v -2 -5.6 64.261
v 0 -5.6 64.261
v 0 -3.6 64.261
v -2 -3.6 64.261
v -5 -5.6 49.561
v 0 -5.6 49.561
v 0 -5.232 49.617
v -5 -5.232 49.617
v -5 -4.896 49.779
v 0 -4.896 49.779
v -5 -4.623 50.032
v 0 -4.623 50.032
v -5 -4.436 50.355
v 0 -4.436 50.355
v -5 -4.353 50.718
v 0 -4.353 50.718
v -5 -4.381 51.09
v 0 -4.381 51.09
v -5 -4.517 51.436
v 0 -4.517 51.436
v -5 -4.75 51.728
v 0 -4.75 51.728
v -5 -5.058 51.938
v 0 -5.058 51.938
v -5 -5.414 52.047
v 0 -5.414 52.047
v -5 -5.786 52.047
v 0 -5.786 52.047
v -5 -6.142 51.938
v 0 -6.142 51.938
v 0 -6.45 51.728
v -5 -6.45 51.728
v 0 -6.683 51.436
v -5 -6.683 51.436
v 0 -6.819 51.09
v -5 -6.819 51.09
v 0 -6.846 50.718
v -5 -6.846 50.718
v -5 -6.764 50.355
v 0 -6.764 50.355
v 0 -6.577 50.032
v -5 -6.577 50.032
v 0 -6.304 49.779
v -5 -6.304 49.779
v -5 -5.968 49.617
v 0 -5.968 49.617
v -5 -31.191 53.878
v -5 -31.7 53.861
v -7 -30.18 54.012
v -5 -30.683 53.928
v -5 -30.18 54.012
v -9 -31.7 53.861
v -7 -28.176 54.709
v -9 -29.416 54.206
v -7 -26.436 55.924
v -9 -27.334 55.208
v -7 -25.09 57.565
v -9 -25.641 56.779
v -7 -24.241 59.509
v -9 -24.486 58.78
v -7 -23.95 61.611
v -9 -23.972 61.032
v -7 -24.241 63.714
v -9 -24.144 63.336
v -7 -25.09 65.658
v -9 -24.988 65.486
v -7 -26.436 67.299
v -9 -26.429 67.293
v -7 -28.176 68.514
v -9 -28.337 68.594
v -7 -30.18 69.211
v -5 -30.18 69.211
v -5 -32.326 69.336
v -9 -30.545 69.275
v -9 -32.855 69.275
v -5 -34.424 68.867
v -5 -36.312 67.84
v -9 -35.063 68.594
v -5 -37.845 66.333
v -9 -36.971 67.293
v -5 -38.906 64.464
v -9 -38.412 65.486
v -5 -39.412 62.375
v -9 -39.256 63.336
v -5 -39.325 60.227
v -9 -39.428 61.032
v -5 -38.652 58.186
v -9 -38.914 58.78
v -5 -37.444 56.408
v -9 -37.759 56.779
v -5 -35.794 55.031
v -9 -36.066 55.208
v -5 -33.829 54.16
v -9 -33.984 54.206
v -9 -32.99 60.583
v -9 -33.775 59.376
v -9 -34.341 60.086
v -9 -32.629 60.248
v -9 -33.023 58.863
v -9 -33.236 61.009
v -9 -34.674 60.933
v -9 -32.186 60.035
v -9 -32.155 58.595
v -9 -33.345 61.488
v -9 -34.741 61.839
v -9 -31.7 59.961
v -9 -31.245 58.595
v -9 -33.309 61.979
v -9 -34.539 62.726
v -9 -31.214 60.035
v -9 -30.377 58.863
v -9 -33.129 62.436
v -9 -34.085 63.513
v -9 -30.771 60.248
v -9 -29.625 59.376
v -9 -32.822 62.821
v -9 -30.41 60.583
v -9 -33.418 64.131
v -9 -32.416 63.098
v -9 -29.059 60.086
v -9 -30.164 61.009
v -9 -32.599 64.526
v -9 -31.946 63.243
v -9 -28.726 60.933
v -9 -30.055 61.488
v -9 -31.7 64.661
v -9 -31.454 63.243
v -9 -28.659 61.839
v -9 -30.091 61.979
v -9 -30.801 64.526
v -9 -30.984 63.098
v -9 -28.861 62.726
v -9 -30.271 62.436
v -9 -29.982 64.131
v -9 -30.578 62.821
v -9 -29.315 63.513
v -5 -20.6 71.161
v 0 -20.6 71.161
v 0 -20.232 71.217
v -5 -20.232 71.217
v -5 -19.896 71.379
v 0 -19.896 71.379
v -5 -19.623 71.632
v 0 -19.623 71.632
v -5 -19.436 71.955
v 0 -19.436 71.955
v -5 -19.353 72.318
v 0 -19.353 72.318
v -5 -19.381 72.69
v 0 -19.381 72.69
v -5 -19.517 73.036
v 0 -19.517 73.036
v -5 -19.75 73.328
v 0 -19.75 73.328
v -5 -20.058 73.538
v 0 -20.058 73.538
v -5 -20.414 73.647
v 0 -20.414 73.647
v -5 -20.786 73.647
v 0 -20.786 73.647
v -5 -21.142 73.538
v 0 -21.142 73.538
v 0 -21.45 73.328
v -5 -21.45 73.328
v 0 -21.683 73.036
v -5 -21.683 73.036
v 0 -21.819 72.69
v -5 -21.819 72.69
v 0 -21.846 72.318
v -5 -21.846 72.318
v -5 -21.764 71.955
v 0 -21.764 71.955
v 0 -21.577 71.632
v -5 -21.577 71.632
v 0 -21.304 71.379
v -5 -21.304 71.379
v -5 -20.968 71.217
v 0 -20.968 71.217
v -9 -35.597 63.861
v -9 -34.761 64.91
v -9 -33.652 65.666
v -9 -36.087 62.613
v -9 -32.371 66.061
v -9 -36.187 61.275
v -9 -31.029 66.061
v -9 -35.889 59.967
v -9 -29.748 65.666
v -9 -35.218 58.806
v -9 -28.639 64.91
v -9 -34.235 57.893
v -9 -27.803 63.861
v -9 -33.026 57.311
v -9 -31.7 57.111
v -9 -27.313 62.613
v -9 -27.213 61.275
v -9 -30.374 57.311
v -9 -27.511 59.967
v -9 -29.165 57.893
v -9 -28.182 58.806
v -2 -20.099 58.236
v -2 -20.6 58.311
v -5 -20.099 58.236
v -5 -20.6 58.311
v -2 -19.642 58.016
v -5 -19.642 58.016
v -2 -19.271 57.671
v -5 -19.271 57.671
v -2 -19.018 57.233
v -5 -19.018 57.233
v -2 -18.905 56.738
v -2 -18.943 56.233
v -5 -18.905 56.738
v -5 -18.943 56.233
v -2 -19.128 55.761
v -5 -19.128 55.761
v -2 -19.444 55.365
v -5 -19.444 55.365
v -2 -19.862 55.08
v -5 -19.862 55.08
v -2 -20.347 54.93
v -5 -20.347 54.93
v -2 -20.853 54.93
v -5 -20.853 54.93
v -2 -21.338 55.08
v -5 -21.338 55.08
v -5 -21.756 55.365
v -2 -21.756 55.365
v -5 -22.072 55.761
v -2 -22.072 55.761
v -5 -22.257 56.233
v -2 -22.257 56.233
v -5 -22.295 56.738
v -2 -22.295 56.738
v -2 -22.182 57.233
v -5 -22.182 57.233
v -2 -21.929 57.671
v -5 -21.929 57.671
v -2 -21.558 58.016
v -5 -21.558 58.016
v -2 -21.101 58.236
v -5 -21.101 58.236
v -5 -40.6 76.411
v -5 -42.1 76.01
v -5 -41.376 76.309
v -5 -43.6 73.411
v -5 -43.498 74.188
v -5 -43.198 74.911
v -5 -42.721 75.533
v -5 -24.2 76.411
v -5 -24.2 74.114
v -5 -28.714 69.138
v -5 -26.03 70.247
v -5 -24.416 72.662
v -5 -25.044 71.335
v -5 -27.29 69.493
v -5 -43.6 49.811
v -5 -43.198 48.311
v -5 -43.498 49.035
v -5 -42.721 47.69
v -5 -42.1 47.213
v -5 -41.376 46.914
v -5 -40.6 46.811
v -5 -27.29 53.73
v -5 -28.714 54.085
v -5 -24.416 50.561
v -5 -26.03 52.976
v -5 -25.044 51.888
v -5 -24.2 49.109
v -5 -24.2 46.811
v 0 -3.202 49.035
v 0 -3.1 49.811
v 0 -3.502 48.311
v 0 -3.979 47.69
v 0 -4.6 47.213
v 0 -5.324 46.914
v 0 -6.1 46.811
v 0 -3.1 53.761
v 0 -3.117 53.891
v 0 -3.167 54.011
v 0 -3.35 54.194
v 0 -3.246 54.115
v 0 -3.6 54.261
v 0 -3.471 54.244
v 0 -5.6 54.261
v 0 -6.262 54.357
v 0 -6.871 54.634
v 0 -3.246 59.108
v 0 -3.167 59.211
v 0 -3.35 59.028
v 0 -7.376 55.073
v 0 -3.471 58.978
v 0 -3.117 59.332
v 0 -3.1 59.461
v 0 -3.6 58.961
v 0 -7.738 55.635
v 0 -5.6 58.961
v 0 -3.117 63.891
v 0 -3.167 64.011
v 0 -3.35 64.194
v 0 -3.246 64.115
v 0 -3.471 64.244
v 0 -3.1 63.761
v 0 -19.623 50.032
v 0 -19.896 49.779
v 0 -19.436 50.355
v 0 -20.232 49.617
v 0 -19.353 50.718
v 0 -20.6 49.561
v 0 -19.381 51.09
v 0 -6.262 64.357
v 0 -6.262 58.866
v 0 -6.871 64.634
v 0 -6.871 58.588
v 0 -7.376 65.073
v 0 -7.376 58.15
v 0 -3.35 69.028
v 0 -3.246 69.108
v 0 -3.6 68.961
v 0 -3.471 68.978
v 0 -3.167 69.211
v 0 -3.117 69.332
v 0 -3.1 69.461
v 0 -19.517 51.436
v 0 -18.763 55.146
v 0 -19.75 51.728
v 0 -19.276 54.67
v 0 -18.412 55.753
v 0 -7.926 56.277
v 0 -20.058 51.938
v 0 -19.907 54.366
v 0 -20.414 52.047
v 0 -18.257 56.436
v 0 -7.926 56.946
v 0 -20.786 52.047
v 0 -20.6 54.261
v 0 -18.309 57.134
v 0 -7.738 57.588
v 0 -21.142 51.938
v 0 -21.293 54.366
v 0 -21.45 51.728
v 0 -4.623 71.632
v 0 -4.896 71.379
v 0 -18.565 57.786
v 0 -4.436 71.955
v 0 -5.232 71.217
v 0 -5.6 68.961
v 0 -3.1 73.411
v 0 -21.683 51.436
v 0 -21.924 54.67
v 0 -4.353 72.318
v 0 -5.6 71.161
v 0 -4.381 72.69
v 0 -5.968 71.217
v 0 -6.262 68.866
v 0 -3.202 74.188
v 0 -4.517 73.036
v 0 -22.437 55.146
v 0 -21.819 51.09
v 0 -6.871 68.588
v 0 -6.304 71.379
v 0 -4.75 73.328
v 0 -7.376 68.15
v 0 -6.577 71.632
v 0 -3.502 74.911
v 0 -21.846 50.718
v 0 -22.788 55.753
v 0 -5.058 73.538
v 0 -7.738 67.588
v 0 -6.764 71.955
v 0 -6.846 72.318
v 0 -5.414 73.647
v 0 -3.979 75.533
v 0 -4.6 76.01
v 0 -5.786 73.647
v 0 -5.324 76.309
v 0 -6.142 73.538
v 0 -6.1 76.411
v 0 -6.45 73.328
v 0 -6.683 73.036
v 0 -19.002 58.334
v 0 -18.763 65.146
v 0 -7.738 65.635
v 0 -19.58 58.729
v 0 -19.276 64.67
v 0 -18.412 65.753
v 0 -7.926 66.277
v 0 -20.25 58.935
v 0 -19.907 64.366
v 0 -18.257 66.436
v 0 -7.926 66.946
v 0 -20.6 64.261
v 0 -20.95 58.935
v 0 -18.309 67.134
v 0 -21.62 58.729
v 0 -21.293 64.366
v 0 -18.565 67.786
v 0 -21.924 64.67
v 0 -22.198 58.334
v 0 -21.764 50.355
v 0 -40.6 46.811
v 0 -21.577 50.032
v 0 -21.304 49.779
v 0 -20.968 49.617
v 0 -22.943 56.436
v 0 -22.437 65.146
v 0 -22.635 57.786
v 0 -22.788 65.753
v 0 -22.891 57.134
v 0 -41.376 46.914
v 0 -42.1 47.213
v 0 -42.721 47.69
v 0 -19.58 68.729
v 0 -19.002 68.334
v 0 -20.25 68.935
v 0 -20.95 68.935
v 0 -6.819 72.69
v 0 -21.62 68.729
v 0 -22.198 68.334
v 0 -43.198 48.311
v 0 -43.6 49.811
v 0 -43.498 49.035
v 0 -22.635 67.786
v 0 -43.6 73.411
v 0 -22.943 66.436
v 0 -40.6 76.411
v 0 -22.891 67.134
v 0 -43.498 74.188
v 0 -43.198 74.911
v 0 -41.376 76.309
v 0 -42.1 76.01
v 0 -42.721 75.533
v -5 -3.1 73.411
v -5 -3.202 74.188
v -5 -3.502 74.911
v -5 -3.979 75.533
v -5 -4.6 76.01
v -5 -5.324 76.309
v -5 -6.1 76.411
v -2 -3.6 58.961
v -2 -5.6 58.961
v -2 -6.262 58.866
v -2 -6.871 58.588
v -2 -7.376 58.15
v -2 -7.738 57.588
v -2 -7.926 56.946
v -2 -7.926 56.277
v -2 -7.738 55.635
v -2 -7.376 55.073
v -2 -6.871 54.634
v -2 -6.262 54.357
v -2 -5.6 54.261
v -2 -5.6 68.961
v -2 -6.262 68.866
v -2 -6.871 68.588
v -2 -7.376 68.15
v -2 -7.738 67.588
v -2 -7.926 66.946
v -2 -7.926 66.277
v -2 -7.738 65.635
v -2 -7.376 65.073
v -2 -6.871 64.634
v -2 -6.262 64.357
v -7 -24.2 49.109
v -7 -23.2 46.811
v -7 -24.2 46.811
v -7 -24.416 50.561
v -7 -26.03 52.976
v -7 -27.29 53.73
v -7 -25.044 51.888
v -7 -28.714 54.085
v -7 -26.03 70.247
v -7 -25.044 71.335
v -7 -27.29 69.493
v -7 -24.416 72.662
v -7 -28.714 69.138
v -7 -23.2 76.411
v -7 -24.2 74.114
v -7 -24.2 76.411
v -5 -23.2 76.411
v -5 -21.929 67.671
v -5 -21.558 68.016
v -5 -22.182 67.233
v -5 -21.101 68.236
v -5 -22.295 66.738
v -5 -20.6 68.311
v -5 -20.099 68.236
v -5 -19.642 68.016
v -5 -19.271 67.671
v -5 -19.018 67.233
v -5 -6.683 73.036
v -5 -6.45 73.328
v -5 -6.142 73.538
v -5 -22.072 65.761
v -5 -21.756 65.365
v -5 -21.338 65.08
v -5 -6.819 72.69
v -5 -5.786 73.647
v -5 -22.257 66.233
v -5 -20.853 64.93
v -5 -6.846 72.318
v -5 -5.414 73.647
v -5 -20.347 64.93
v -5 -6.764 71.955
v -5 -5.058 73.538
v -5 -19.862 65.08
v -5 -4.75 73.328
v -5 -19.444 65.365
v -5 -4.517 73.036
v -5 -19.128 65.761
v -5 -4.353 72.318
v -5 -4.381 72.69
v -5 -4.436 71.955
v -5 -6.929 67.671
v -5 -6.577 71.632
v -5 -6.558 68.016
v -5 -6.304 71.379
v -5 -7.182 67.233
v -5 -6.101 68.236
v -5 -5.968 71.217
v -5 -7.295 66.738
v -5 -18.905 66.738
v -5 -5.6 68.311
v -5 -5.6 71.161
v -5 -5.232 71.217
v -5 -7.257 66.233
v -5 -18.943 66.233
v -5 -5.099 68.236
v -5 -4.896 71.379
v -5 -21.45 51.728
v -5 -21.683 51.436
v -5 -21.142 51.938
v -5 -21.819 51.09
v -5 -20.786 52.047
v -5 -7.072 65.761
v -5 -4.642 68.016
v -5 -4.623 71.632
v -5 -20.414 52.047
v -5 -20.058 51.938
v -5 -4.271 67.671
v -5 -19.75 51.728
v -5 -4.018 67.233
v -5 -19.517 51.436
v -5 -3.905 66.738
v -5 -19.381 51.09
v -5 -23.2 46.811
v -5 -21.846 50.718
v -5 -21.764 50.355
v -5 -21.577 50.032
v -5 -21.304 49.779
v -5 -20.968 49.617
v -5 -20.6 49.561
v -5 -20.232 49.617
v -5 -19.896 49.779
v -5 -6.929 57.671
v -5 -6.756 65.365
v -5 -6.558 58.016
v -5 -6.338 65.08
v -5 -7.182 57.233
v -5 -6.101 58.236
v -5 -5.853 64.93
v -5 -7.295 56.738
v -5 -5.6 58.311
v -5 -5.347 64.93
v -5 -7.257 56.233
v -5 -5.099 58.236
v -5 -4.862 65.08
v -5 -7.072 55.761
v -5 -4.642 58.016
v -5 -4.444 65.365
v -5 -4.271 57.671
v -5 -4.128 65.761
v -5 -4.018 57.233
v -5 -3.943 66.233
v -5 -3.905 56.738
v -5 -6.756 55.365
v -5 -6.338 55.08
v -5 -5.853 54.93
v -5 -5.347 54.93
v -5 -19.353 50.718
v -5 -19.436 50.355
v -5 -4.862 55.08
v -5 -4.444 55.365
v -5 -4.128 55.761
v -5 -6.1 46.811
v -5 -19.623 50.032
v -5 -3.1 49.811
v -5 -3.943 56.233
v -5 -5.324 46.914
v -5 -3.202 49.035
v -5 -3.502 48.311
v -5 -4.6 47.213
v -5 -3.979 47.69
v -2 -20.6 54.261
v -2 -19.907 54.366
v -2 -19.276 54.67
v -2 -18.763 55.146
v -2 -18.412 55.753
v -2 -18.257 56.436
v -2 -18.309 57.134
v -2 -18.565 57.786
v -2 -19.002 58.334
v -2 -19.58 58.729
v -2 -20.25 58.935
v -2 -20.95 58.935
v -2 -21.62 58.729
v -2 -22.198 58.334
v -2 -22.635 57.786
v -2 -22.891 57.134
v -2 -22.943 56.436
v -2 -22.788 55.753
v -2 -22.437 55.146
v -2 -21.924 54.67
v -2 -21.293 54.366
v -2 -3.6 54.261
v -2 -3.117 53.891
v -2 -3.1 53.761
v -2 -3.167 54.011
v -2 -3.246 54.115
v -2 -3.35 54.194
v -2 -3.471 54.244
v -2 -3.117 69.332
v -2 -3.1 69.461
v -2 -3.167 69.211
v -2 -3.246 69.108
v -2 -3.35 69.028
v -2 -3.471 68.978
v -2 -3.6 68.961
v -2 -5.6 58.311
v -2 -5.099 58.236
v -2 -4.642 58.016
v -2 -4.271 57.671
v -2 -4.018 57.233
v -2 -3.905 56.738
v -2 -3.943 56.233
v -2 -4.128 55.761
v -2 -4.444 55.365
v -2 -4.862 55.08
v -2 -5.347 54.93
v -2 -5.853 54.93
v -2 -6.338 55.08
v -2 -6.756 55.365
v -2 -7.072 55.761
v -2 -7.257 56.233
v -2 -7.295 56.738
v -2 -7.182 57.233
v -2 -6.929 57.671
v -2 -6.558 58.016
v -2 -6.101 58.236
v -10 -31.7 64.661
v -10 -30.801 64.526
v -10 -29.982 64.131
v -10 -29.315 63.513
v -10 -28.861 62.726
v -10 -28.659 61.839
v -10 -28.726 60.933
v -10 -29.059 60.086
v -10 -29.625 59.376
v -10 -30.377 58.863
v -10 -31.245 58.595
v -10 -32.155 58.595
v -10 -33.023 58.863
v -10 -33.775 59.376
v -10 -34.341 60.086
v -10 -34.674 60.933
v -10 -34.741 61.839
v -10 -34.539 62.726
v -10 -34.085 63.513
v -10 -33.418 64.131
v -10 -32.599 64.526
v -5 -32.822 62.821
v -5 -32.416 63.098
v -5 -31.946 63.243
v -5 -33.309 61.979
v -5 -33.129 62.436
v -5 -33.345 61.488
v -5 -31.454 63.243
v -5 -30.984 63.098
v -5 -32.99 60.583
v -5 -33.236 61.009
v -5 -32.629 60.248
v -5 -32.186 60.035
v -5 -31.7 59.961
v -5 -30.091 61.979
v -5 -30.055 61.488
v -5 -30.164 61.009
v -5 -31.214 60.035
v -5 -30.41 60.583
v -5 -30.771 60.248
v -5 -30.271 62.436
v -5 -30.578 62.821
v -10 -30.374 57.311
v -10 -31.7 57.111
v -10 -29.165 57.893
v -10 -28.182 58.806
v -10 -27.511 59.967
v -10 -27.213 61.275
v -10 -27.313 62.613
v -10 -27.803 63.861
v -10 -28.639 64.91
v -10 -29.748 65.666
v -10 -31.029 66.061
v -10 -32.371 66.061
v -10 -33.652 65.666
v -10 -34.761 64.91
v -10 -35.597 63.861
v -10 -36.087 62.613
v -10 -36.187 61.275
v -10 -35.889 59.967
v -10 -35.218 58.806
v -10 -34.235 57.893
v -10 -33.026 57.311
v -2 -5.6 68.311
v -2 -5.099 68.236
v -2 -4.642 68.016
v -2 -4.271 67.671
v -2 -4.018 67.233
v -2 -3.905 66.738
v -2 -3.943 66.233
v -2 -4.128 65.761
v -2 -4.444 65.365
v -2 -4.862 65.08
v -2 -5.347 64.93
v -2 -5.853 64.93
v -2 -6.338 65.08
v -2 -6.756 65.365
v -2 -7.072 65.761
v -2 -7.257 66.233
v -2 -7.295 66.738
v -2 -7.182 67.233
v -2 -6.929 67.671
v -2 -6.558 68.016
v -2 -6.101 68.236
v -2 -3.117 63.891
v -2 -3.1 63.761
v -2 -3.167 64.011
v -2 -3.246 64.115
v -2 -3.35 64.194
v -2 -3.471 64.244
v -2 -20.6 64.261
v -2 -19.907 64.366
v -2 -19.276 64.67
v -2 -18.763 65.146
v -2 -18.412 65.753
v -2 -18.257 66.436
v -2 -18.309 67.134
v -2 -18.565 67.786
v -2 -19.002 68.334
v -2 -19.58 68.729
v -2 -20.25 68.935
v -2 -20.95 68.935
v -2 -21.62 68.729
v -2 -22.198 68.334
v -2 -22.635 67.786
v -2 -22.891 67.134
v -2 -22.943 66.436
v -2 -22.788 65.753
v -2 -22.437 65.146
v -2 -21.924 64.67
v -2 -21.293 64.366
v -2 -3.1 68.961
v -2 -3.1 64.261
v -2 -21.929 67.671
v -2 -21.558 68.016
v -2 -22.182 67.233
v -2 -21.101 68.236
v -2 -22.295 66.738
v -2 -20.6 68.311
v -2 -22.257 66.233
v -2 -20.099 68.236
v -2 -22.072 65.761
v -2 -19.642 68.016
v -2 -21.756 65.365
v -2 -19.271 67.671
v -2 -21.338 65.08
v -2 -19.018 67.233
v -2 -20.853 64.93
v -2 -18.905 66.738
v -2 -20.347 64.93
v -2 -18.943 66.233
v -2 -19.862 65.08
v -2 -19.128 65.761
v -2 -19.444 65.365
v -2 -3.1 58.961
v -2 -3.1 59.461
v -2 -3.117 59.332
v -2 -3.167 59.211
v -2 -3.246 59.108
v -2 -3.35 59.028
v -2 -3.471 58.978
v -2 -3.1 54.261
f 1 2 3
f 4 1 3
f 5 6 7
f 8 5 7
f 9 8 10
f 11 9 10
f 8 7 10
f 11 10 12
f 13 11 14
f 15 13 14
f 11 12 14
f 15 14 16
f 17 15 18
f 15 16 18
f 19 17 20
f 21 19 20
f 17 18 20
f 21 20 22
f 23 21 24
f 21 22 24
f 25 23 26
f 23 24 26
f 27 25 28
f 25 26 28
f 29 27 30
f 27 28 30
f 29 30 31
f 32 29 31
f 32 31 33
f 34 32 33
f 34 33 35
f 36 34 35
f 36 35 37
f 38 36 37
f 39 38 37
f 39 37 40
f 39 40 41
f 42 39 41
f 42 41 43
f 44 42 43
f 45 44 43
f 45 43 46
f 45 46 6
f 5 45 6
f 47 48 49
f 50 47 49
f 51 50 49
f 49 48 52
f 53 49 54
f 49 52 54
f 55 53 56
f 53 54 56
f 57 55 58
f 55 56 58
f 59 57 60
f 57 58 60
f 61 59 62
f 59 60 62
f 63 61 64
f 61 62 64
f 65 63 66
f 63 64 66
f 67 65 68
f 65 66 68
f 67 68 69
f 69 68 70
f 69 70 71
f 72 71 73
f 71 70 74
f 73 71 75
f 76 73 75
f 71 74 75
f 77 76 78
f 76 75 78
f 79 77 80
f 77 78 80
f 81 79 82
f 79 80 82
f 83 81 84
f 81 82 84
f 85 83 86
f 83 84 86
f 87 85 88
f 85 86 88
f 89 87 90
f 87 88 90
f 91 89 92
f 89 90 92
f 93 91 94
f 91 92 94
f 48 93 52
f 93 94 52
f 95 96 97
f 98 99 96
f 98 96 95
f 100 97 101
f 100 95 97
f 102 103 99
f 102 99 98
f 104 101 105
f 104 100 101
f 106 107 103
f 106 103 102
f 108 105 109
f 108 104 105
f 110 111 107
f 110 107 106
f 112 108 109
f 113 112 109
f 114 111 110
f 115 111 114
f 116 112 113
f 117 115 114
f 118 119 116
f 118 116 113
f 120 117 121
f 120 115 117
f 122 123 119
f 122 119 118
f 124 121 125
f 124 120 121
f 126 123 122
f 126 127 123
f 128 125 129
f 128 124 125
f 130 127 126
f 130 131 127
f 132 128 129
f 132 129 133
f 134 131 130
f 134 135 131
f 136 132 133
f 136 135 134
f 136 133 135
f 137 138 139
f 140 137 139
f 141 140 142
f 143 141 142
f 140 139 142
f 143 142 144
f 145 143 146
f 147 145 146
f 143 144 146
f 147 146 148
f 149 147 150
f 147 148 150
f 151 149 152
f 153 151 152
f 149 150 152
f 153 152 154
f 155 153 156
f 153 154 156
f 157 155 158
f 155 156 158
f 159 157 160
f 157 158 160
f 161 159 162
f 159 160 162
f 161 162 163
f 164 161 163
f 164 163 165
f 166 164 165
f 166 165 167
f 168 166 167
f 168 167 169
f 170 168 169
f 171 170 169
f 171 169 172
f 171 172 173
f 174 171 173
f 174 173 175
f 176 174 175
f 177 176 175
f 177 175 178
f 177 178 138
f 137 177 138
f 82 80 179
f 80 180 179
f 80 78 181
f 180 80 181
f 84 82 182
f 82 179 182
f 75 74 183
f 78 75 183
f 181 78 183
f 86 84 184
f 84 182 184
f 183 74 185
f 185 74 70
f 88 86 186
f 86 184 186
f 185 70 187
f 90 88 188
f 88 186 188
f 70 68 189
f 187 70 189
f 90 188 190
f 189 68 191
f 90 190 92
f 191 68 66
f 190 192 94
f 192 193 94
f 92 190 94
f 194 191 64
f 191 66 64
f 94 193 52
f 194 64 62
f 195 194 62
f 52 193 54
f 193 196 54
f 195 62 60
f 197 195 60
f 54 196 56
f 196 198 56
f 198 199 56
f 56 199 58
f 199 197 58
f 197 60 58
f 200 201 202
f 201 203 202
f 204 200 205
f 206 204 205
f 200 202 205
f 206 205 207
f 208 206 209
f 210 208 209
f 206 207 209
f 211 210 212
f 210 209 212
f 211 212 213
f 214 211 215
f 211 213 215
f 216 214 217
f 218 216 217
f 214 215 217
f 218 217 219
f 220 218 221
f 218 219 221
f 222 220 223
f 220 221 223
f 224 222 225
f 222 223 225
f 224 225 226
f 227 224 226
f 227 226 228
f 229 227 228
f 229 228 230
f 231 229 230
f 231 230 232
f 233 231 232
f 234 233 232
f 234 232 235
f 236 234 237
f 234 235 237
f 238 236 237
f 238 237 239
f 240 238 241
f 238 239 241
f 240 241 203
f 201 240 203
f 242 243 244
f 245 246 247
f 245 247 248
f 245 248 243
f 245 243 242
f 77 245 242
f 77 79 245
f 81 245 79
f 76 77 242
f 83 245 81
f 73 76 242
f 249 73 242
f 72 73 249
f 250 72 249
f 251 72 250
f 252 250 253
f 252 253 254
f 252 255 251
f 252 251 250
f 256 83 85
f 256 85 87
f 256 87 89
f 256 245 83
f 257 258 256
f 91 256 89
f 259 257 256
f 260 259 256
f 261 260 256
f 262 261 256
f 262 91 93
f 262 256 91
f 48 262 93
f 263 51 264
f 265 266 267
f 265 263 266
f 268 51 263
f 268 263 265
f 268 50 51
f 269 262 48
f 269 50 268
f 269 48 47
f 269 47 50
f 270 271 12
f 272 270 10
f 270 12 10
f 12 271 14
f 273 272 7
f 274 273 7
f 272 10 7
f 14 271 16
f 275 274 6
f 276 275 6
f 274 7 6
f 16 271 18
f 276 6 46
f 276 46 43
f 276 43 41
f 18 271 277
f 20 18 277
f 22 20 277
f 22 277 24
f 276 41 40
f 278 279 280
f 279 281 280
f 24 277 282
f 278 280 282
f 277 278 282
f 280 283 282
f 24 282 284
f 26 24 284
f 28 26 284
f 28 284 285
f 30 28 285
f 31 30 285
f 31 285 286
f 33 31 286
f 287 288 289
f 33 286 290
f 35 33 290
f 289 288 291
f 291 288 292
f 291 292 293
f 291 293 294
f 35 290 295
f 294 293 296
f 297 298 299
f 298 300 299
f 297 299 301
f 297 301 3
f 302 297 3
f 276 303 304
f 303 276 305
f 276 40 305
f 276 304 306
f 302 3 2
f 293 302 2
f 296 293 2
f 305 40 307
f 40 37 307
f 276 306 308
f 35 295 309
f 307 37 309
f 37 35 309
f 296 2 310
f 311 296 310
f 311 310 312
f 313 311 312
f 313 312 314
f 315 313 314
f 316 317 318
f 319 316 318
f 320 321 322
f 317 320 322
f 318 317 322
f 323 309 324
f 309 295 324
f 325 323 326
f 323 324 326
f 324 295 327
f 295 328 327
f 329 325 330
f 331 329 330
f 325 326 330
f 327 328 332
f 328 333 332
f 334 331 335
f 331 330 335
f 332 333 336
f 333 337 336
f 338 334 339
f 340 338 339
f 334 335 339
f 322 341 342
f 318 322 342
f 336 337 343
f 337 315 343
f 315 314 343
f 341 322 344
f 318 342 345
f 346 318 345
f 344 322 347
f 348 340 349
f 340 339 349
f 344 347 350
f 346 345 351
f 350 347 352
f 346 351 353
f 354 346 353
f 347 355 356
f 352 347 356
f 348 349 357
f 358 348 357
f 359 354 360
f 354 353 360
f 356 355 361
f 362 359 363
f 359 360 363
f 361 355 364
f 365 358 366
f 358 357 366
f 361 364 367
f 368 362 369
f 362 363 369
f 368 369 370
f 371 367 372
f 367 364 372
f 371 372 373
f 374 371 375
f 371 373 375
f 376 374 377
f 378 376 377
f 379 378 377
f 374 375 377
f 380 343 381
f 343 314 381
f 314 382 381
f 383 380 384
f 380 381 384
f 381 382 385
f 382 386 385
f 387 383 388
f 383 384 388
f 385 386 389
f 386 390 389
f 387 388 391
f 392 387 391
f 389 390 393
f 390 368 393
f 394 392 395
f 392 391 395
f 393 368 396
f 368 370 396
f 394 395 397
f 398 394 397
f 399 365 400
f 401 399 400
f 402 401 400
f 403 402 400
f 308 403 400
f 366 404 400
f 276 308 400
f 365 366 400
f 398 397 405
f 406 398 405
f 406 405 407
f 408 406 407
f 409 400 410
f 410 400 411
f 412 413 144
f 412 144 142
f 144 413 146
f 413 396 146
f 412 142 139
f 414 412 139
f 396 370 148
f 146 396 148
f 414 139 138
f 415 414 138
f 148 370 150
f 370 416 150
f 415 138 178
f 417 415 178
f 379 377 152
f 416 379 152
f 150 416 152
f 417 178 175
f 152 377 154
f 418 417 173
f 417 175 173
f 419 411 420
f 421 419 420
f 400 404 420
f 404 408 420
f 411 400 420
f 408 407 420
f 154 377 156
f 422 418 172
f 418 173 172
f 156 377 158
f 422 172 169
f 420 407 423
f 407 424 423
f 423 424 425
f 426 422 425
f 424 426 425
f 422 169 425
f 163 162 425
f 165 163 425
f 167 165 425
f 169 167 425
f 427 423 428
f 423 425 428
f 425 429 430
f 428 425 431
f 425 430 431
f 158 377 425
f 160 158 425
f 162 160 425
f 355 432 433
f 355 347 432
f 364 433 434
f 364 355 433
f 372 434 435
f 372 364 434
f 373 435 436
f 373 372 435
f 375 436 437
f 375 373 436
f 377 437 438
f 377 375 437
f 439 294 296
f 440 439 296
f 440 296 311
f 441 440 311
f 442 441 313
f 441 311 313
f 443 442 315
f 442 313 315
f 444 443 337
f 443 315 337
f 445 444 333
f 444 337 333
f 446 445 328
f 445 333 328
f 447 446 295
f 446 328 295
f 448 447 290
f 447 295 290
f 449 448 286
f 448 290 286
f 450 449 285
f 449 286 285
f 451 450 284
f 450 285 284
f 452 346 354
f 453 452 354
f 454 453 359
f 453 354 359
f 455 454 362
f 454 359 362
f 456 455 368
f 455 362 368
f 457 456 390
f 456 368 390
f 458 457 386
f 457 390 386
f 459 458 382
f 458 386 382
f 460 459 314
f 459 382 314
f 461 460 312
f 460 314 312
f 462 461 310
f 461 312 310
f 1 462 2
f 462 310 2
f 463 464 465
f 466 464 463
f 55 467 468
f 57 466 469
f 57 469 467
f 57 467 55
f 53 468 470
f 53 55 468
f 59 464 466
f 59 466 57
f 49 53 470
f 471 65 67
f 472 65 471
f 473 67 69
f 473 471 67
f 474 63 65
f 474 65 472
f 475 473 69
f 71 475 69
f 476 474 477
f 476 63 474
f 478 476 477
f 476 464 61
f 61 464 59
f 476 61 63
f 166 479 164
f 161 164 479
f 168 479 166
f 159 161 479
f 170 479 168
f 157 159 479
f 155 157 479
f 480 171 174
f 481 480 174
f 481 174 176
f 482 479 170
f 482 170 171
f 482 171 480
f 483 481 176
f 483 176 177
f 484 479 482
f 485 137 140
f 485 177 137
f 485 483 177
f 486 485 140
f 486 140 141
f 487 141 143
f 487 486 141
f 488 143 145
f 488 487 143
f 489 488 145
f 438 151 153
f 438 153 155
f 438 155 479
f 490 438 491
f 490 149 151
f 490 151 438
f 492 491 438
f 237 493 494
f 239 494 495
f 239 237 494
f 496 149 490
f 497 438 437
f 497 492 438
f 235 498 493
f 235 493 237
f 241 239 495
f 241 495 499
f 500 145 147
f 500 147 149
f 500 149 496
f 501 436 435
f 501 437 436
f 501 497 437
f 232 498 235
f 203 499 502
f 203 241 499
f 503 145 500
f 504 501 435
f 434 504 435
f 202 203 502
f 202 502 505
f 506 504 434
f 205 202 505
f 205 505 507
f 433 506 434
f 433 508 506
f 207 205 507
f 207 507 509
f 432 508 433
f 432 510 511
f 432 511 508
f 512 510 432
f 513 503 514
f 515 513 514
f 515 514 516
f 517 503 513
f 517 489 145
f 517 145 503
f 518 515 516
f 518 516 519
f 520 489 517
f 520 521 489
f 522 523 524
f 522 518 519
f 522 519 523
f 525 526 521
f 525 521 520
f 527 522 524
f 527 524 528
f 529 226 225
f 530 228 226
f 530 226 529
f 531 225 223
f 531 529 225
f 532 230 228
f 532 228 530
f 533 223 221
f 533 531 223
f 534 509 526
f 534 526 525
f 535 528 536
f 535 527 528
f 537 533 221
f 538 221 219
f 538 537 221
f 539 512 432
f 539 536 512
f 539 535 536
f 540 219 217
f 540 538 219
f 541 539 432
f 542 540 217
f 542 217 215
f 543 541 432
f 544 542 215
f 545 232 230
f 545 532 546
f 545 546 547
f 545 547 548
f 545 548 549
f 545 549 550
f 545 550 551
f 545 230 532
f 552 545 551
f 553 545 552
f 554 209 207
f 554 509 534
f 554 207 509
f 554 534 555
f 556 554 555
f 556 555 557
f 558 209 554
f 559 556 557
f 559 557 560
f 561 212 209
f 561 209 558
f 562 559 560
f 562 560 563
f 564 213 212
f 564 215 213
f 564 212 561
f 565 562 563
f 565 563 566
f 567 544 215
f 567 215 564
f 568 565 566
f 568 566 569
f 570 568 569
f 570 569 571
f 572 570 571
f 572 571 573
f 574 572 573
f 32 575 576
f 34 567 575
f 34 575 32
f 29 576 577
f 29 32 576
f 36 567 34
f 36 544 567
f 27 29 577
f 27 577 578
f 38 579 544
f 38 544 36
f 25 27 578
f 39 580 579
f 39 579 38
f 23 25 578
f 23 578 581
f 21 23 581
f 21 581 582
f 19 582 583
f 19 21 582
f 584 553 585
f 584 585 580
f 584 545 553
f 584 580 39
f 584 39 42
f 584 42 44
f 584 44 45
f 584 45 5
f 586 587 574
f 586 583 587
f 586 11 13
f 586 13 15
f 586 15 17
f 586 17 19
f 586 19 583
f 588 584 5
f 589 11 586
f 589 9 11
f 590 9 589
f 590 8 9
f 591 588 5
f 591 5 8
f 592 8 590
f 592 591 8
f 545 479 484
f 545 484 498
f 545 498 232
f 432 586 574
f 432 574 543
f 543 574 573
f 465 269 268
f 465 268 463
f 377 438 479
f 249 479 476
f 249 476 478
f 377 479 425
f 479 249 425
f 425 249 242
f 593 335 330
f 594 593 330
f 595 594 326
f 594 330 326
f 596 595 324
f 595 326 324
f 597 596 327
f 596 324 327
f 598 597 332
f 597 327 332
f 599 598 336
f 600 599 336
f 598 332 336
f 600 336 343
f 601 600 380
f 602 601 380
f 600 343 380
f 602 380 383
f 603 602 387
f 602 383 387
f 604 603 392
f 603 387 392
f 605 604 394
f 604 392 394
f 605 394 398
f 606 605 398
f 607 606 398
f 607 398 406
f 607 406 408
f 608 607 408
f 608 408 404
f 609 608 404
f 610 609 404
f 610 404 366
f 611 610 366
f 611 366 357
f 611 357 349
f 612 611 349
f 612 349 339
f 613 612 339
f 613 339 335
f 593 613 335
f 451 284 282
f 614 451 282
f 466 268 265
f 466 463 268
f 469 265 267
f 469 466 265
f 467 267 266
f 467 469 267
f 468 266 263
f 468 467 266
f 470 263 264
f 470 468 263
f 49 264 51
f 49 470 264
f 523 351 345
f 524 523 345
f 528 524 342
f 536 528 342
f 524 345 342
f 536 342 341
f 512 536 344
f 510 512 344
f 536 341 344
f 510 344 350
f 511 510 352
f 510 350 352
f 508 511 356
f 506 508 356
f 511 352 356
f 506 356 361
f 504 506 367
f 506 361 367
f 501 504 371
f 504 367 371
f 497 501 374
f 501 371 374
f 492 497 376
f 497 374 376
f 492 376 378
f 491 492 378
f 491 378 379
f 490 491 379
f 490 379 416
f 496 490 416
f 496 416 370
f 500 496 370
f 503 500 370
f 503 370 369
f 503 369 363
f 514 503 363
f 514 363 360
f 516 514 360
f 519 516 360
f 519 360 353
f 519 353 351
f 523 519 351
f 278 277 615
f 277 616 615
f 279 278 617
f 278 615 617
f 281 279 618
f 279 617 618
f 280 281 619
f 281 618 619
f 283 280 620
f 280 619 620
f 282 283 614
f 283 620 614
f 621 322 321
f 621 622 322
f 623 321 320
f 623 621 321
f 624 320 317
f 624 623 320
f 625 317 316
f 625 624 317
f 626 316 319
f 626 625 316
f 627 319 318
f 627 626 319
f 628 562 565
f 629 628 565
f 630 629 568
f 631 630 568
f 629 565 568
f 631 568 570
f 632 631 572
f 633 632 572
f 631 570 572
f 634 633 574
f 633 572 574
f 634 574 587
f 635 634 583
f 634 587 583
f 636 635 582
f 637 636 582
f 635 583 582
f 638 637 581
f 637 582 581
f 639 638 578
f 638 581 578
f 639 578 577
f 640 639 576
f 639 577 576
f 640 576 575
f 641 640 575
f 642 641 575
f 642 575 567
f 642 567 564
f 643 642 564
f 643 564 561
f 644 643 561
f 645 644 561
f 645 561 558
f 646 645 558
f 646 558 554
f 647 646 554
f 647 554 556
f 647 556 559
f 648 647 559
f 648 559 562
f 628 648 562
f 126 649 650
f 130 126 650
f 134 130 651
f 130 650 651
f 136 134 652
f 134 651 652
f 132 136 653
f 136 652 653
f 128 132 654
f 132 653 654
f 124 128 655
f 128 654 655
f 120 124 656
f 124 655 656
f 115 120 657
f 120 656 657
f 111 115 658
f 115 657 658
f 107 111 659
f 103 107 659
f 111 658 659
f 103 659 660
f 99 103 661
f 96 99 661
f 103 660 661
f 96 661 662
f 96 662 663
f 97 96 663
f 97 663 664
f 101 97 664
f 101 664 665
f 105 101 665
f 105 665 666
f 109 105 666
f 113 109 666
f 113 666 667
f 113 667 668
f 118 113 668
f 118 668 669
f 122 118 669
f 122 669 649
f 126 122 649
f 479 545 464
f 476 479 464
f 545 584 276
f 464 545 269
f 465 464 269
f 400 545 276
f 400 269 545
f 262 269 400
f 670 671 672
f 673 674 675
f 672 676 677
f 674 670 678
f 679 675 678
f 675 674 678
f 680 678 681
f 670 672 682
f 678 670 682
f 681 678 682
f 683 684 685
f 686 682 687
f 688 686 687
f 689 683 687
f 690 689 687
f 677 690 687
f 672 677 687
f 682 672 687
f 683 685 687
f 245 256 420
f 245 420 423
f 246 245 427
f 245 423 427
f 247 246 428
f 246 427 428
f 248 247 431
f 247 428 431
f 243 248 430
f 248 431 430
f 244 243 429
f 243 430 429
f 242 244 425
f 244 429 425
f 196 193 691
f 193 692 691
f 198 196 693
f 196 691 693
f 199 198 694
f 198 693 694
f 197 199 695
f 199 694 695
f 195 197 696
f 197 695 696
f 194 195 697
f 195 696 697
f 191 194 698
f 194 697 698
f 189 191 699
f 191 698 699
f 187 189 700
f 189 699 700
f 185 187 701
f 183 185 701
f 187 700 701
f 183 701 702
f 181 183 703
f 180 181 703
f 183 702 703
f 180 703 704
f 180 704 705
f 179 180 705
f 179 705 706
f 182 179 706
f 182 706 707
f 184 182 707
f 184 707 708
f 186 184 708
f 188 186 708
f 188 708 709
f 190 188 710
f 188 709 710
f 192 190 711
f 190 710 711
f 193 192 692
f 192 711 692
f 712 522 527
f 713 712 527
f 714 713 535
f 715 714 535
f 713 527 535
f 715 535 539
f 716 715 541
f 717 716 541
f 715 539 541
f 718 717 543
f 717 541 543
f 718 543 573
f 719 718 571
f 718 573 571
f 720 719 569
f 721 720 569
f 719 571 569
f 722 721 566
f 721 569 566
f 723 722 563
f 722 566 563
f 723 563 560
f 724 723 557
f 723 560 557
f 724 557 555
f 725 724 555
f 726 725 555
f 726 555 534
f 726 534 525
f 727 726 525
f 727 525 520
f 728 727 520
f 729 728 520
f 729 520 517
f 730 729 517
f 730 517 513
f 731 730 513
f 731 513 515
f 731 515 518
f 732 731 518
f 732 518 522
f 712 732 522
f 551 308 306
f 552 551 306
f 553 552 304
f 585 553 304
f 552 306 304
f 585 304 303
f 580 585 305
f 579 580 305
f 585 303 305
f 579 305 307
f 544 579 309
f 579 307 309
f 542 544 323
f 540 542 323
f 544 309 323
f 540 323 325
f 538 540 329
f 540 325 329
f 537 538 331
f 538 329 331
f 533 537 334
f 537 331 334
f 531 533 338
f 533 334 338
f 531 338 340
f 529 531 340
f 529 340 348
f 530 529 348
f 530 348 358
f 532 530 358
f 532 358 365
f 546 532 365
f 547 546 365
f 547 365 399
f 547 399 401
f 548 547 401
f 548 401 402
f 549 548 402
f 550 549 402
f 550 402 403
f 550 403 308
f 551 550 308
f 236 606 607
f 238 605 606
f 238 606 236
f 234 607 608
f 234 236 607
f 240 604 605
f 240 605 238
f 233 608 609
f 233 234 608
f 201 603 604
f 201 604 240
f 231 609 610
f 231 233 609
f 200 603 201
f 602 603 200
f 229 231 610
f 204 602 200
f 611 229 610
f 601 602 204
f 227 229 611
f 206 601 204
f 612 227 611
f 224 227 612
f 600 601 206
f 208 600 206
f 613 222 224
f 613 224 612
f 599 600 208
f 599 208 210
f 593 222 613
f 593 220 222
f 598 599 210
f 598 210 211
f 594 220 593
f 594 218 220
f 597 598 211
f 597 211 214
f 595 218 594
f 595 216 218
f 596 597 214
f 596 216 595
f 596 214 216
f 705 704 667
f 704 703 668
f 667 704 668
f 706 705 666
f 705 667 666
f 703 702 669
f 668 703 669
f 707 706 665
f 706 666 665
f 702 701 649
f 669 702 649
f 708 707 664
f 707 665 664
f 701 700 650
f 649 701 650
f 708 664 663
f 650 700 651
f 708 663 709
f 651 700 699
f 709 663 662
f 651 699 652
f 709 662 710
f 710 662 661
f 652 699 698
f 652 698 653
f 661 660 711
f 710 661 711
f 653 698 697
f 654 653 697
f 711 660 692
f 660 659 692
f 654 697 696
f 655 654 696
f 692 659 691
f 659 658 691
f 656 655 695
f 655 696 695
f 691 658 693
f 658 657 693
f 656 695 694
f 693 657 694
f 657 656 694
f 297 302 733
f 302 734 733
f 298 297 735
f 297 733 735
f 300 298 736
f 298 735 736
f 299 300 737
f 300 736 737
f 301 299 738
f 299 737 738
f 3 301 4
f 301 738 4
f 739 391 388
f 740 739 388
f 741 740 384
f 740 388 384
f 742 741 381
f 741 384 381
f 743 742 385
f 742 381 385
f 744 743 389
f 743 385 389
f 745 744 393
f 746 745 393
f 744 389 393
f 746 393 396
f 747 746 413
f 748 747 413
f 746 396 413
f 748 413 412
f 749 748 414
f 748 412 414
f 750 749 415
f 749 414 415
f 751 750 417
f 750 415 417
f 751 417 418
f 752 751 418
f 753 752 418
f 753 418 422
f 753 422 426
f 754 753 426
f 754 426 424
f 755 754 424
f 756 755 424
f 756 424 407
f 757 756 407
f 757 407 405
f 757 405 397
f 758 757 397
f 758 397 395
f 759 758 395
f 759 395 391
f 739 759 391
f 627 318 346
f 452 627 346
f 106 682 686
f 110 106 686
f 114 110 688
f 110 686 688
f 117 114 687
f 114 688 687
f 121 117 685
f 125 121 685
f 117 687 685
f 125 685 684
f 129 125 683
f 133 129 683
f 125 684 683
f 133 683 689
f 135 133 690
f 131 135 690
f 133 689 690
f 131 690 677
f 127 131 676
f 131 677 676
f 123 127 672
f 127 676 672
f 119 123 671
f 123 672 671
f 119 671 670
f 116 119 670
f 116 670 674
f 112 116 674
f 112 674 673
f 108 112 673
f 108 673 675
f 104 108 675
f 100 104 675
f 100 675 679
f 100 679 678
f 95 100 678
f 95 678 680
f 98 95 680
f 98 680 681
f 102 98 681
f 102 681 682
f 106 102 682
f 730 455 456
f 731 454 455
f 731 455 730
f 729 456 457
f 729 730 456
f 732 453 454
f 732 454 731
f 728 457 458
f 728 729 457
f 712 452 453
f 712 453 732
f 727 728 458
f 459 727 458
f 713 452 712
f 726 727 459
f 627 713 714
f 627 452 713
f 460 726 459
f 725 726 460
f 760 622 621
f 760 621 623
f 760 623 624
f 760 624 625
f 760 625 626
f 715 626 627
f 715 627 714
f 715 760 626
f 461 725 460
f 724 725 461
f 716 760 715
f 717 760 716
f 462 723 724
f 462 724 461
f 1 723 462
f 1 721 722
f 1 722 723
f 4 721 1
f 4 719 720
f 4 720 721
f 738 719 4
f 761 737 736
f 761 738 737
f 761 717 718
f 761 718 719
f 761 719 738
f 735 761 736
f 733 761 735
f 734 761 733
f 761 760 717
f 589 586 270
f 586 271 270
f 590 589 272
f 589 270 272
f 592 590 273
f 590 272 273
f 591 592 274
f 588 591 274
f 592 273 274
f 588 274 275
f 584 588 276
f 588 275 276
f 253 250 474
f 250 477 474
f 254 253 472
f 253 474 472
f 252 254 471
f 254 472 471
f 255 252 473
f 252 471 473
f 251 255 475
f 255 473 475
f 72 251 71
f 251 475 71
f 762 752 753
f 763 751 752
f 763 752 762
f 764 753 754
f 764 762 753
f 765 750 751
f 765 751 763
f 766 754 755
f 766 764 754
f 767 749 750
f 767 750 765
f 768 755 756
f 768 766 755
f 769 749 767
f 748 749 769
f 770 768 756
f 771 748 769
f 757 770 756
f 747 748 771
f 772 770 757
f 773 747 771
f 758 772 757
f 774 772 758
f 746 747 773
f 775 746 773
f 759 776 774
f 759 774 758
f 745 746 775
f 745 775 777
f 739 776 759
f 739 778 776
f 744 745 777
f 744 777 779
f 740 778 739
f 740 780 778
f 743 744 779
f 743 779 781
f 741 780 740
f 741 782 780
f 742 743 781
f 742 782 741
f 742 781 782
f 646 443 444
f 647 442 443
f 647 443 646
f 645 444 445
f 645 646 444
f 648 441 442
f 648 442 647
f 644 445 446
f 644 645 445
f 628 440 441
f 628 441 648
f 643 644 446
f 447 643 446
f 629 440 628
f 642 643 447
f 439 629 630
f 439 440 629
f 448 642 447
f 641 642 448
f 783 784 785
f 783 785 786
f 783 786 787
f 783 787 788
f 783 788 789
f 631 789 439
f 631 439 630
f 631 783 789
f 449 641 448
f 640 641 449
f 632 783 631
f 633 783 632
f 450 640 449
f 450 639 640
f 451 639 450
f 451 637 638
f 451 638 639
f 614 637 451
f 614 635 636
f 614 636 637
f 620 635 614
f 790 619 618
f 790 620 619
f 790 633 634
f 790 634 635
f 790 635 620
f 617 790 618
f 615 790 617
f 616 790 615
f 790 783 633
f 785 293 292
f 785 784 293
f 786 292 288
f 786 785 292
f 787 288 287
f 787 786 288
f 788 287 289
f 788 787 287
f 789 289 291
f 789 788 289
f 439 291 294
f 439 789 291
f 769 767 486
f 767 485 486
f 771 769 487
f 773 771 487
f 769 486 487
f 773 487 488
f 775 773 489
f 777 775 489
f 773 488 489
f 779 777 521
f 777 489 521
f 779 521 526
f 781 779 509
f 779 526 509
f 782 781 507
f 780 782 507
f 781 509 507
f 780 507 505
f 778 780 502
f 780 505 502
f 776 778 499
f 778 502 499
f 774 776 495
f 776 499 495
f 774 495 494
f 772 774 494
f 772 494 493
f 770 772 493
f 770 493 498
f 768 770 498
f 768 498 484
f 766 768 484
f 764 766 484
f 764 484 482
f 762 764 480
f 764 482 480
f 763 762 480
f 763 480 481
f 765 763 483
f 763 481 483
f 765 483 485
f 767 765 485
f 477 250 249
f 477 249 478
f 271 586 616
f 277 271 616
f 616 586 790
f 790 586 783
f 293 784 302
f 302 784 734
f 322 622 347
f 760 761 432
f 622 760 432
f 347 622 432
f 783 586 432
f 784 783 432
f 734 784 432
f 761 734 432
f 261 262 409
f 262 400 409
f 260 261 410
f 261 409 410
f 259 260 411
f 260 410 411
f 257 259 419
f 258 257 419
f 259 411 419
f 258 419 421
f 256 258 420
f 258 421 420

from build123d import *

# Parameters (mm, degrees)
SKETCH_1_W                   = 40.499972991
SKETCH_1_H                   = 29.6
EXTRUDE_1_DEPTH              = 7
SKETCH_2_W                   = 2
SKETCH_2_H                   = 20.10000001
CUT_EXTRUDE_1_DEPTH          = 54.161241934
SKETCH_3_W                   = 2
SKETCH_3_H                   = 19.399972981
CUT_EXTRUDE_2_DEPTH          = 54.161241934
CUT_EXTRUDE_3_DEPTH          = 2
CUT_EXTRUDE_4_DEPTH          = 2
HOLE_WIZARD_2_5_2_5_1_D      = 2.5
HOLE_WIZARD_3_4_3_4_1_D      = 3.4
HOLE_WIZARD_3_4_3_4_1_DEPTH  = 8
HOLE_WIZARD_M3_1_D           = 3.4
HOLE_WIZARD_M3_1_DEPTH       = 10
HOLE_WIZARD_M3_1_CBORE_D     = 4.7
HOLE_WIZARD_M3_1_CBORE_DEPTH = 2
HOLE_WIZARD_M3_2_D           = 3.3
HOLE_WIZARD_M3_2_DEPTH       = 5
HOLE_WIZARD_M3_2_CBORE_D     = 6.1
HOLE_WIZARD_M3_2_CBORE_DEPTH = 1
FILLET_1_R                   = 0.5
FILLET_2_R                   = 3
FILLET_3_R                   = 5


with BuildPart() as part:
    # 草图1 → 凸台-拉伸1 (new body)
    with BuildSketch(Plane(origin=(-7, 0, 0), x_dir=(0, -1, 0), z_dir=(-1, 0, 0))):
        with Locations((23.349986486, 61.611428686)):
            Rectangle(SKETCH_1_W, SKETCH_1_H)
    extrude(amount=-EXTRUDE_1_DEPTH)

    # 草图2 → 切除-拉伸1 (cut, through all)
    with BuildSketch(Plane(origin=(0, 0, 46.811428686), x_dir=(-1, 0, 0), z_dir=(0, 0, -1))):
        with Locations((6, -13.149999995)):
            Rectangle(SKETCH_2_W, SKETCH_2_H)
    extrude(amount=-CUT_EXTRUDE_1_DEPTH, mode=Mode.SUBTRACT)

    # 草图3 → 切除-拉伸2 (cut, through all)
    with BuildSketch(Plane(origin=(0, 0, 46.811428686), x_dir=(-1, 0, 0), z_dir=(0, 0, -1))):
        with Locations((6, -33.89998649)):
            Rectangle(SKETCH_3_W, SKETCH_3_H)
    extrude(amount=-CUT_EXTRUDE_2_DEPTH, mode=Mode.SUBTRACT)

    # 草图4 → 切除-拉伸3 (cut)
    with BuildSketch(Plane(origin=(0, 0, 0), x_dir=(0, 0, -1), z_dir=(1, 0, 0))):
        with BuildLine():
            Line((-58.961428686, -3.09999999), (-58.961428686, -5.6))
            ThreePointArc((-58.961428686, -5.6), (-56.611428686, -7.95), (-54.261428686, -5.6))
            Line((-54.261428686, -5.6), (-54.261428686, -3.09999999))
            Line((-54.261428686, -3.09999999), (-58.961428686, -3.09999999))
        make_face()
    extrude(amount=-CUT_EXTRUDE_3_DEPTH, mode=Mode.SUBTRACT)

    # 草图5 → 切除-拉伸4 (cut)
    with BuildSketch(Plane(origin=(0, 0, 0), x_dir=(0, 0, -1), z_dir=(1, 0, 0))):
        with BuildLine():
            Line((-68.961428686, -3.09999999), (-68.961428686, -5.6))
            ThreePointArc((-68.961428686, -5.6), (-66.611428686, -7.95), (-64.261428686, -5.6))
            Line((-64.261428686, -5.6), (-64.261428686, -3.09999999))
            Line((-64.261428686, -3.09999999), (-68.961428686, -3.09999999))
        make_face()
    extrude(amount=-CUT_EXTRUDE_4_DEPTH, mode=Mode.SUBTRACT)

    # 草图6 → 旋转1 (revolve)
    with BuildSketch(Plane(origin=(0, -31.7, 0), x_dir=(1, 0, 0), z_dir=(0, 1, 0))):
        Polygon((-10, -57.111428686), (-10, -61.611428686), (-5, -61.611428686), (-5, -53.861428686), (-9, -53.861428686), (-9, -57.111428686), align=None)
    revolve(axis=Axis((-10, -31.7, 61.611428686), (1, 0, 0)))

    # Ø2.5 (2.5) 直径孔1 (through all)
    with Locations(Plane.ZY.offset(5)):
        with Locations((72.411428686, -5.599972981), (50.811428686, -20.599972981), (72.411428686, -20.599972981), (50.811428686, -5.599972981)):
            Hole(HOLE_WIZARD_2_5_2_5_1_D / 2)

    # Ø3.4 (3.4) 直径孔1
    with Locations(Plane(origin=(-2, 0, 0), x_dir=(0, 0, -1), z_dir=(1, 0, 0))):
        with Locations((-56.611428686, -5.6), (-66.611428686, -5.6)):
            Hole(HOLE_WIZARD_3_4_3_4_1_D / 2, depth=HOLE_WIZARD_3_4_3_4_1_DEPTH)

    # M3 六角头机械螺钉的柱形沉头孔1
    with Locations(Plane(origin=(0, 0, 0), x_dir=(0, 0, -1), z_dir=(1, 0, 0))):
        with Locations((-56.611428686, -20.6), (-66.611428686, -20.6)):
            CounterBoreHole(HOLE_WIZARD_M3_1_D / 2, HOLE_WIZARD_M3_1_CBORE_D / 2, HOLE_WIZARD_M3_1_CBORE_DEPTH, depth=HOLE_WIZARD_M3_1_DEPTH)

    # M3 六角头机械螺钉的柱形沉头孔2
    with Locations(Plane.ZY.offset(10)):
        with Locations((61.611428686, -31.7)):
            CounterBoreHole(HOLE_WIZARD_M3_2_D / 2, HOLE_WIZARD_M3_2_CBORE_D / 2, HOLE_WIZARD_M3_2_CBORE_DEPTH, depth=HOLE_WIZARD_M3_2_DEPTH)

    # 圆角1
    fillet_1_edges = [part.edges().sort_by_distance(p)[0] for p in [
        (-1, -3.09999999, 58.961428686),
        (-1, -3.09999999, 54.261428686),
        (-1, -3.09999999, 68.961428686),
        (-1, -3.09999999, 64.261428686),
    ]]
    fillet(fillet_1_edges, radius=FILLET_1_R)

    # 圆角2
    fillet_2_edges = [part.edges().sort_by_distance(p)[0] for p in [
        (-2.5, -3.09999999, 76.411428686),
        (-2.5, -43.599972981, 76.411428686),
        (-2.5, -43.599972981, 46.811428686),
        (-2.5, -3.09999999, 46.811428686),
    ]]
    fillet(fillet_2_edges, radius=FILLET_2_R)

    # 圆角3
    fillet_3_edges = [part.edges().sort_by_distance(p)[0] for p in [
        (-6, -24.2, 59.658866267),
        (-6, -24.2, 63.563991105),
    ]]
    fillet(fillet_3_edges, radius=FILLET_3_R)


solid = part.part
